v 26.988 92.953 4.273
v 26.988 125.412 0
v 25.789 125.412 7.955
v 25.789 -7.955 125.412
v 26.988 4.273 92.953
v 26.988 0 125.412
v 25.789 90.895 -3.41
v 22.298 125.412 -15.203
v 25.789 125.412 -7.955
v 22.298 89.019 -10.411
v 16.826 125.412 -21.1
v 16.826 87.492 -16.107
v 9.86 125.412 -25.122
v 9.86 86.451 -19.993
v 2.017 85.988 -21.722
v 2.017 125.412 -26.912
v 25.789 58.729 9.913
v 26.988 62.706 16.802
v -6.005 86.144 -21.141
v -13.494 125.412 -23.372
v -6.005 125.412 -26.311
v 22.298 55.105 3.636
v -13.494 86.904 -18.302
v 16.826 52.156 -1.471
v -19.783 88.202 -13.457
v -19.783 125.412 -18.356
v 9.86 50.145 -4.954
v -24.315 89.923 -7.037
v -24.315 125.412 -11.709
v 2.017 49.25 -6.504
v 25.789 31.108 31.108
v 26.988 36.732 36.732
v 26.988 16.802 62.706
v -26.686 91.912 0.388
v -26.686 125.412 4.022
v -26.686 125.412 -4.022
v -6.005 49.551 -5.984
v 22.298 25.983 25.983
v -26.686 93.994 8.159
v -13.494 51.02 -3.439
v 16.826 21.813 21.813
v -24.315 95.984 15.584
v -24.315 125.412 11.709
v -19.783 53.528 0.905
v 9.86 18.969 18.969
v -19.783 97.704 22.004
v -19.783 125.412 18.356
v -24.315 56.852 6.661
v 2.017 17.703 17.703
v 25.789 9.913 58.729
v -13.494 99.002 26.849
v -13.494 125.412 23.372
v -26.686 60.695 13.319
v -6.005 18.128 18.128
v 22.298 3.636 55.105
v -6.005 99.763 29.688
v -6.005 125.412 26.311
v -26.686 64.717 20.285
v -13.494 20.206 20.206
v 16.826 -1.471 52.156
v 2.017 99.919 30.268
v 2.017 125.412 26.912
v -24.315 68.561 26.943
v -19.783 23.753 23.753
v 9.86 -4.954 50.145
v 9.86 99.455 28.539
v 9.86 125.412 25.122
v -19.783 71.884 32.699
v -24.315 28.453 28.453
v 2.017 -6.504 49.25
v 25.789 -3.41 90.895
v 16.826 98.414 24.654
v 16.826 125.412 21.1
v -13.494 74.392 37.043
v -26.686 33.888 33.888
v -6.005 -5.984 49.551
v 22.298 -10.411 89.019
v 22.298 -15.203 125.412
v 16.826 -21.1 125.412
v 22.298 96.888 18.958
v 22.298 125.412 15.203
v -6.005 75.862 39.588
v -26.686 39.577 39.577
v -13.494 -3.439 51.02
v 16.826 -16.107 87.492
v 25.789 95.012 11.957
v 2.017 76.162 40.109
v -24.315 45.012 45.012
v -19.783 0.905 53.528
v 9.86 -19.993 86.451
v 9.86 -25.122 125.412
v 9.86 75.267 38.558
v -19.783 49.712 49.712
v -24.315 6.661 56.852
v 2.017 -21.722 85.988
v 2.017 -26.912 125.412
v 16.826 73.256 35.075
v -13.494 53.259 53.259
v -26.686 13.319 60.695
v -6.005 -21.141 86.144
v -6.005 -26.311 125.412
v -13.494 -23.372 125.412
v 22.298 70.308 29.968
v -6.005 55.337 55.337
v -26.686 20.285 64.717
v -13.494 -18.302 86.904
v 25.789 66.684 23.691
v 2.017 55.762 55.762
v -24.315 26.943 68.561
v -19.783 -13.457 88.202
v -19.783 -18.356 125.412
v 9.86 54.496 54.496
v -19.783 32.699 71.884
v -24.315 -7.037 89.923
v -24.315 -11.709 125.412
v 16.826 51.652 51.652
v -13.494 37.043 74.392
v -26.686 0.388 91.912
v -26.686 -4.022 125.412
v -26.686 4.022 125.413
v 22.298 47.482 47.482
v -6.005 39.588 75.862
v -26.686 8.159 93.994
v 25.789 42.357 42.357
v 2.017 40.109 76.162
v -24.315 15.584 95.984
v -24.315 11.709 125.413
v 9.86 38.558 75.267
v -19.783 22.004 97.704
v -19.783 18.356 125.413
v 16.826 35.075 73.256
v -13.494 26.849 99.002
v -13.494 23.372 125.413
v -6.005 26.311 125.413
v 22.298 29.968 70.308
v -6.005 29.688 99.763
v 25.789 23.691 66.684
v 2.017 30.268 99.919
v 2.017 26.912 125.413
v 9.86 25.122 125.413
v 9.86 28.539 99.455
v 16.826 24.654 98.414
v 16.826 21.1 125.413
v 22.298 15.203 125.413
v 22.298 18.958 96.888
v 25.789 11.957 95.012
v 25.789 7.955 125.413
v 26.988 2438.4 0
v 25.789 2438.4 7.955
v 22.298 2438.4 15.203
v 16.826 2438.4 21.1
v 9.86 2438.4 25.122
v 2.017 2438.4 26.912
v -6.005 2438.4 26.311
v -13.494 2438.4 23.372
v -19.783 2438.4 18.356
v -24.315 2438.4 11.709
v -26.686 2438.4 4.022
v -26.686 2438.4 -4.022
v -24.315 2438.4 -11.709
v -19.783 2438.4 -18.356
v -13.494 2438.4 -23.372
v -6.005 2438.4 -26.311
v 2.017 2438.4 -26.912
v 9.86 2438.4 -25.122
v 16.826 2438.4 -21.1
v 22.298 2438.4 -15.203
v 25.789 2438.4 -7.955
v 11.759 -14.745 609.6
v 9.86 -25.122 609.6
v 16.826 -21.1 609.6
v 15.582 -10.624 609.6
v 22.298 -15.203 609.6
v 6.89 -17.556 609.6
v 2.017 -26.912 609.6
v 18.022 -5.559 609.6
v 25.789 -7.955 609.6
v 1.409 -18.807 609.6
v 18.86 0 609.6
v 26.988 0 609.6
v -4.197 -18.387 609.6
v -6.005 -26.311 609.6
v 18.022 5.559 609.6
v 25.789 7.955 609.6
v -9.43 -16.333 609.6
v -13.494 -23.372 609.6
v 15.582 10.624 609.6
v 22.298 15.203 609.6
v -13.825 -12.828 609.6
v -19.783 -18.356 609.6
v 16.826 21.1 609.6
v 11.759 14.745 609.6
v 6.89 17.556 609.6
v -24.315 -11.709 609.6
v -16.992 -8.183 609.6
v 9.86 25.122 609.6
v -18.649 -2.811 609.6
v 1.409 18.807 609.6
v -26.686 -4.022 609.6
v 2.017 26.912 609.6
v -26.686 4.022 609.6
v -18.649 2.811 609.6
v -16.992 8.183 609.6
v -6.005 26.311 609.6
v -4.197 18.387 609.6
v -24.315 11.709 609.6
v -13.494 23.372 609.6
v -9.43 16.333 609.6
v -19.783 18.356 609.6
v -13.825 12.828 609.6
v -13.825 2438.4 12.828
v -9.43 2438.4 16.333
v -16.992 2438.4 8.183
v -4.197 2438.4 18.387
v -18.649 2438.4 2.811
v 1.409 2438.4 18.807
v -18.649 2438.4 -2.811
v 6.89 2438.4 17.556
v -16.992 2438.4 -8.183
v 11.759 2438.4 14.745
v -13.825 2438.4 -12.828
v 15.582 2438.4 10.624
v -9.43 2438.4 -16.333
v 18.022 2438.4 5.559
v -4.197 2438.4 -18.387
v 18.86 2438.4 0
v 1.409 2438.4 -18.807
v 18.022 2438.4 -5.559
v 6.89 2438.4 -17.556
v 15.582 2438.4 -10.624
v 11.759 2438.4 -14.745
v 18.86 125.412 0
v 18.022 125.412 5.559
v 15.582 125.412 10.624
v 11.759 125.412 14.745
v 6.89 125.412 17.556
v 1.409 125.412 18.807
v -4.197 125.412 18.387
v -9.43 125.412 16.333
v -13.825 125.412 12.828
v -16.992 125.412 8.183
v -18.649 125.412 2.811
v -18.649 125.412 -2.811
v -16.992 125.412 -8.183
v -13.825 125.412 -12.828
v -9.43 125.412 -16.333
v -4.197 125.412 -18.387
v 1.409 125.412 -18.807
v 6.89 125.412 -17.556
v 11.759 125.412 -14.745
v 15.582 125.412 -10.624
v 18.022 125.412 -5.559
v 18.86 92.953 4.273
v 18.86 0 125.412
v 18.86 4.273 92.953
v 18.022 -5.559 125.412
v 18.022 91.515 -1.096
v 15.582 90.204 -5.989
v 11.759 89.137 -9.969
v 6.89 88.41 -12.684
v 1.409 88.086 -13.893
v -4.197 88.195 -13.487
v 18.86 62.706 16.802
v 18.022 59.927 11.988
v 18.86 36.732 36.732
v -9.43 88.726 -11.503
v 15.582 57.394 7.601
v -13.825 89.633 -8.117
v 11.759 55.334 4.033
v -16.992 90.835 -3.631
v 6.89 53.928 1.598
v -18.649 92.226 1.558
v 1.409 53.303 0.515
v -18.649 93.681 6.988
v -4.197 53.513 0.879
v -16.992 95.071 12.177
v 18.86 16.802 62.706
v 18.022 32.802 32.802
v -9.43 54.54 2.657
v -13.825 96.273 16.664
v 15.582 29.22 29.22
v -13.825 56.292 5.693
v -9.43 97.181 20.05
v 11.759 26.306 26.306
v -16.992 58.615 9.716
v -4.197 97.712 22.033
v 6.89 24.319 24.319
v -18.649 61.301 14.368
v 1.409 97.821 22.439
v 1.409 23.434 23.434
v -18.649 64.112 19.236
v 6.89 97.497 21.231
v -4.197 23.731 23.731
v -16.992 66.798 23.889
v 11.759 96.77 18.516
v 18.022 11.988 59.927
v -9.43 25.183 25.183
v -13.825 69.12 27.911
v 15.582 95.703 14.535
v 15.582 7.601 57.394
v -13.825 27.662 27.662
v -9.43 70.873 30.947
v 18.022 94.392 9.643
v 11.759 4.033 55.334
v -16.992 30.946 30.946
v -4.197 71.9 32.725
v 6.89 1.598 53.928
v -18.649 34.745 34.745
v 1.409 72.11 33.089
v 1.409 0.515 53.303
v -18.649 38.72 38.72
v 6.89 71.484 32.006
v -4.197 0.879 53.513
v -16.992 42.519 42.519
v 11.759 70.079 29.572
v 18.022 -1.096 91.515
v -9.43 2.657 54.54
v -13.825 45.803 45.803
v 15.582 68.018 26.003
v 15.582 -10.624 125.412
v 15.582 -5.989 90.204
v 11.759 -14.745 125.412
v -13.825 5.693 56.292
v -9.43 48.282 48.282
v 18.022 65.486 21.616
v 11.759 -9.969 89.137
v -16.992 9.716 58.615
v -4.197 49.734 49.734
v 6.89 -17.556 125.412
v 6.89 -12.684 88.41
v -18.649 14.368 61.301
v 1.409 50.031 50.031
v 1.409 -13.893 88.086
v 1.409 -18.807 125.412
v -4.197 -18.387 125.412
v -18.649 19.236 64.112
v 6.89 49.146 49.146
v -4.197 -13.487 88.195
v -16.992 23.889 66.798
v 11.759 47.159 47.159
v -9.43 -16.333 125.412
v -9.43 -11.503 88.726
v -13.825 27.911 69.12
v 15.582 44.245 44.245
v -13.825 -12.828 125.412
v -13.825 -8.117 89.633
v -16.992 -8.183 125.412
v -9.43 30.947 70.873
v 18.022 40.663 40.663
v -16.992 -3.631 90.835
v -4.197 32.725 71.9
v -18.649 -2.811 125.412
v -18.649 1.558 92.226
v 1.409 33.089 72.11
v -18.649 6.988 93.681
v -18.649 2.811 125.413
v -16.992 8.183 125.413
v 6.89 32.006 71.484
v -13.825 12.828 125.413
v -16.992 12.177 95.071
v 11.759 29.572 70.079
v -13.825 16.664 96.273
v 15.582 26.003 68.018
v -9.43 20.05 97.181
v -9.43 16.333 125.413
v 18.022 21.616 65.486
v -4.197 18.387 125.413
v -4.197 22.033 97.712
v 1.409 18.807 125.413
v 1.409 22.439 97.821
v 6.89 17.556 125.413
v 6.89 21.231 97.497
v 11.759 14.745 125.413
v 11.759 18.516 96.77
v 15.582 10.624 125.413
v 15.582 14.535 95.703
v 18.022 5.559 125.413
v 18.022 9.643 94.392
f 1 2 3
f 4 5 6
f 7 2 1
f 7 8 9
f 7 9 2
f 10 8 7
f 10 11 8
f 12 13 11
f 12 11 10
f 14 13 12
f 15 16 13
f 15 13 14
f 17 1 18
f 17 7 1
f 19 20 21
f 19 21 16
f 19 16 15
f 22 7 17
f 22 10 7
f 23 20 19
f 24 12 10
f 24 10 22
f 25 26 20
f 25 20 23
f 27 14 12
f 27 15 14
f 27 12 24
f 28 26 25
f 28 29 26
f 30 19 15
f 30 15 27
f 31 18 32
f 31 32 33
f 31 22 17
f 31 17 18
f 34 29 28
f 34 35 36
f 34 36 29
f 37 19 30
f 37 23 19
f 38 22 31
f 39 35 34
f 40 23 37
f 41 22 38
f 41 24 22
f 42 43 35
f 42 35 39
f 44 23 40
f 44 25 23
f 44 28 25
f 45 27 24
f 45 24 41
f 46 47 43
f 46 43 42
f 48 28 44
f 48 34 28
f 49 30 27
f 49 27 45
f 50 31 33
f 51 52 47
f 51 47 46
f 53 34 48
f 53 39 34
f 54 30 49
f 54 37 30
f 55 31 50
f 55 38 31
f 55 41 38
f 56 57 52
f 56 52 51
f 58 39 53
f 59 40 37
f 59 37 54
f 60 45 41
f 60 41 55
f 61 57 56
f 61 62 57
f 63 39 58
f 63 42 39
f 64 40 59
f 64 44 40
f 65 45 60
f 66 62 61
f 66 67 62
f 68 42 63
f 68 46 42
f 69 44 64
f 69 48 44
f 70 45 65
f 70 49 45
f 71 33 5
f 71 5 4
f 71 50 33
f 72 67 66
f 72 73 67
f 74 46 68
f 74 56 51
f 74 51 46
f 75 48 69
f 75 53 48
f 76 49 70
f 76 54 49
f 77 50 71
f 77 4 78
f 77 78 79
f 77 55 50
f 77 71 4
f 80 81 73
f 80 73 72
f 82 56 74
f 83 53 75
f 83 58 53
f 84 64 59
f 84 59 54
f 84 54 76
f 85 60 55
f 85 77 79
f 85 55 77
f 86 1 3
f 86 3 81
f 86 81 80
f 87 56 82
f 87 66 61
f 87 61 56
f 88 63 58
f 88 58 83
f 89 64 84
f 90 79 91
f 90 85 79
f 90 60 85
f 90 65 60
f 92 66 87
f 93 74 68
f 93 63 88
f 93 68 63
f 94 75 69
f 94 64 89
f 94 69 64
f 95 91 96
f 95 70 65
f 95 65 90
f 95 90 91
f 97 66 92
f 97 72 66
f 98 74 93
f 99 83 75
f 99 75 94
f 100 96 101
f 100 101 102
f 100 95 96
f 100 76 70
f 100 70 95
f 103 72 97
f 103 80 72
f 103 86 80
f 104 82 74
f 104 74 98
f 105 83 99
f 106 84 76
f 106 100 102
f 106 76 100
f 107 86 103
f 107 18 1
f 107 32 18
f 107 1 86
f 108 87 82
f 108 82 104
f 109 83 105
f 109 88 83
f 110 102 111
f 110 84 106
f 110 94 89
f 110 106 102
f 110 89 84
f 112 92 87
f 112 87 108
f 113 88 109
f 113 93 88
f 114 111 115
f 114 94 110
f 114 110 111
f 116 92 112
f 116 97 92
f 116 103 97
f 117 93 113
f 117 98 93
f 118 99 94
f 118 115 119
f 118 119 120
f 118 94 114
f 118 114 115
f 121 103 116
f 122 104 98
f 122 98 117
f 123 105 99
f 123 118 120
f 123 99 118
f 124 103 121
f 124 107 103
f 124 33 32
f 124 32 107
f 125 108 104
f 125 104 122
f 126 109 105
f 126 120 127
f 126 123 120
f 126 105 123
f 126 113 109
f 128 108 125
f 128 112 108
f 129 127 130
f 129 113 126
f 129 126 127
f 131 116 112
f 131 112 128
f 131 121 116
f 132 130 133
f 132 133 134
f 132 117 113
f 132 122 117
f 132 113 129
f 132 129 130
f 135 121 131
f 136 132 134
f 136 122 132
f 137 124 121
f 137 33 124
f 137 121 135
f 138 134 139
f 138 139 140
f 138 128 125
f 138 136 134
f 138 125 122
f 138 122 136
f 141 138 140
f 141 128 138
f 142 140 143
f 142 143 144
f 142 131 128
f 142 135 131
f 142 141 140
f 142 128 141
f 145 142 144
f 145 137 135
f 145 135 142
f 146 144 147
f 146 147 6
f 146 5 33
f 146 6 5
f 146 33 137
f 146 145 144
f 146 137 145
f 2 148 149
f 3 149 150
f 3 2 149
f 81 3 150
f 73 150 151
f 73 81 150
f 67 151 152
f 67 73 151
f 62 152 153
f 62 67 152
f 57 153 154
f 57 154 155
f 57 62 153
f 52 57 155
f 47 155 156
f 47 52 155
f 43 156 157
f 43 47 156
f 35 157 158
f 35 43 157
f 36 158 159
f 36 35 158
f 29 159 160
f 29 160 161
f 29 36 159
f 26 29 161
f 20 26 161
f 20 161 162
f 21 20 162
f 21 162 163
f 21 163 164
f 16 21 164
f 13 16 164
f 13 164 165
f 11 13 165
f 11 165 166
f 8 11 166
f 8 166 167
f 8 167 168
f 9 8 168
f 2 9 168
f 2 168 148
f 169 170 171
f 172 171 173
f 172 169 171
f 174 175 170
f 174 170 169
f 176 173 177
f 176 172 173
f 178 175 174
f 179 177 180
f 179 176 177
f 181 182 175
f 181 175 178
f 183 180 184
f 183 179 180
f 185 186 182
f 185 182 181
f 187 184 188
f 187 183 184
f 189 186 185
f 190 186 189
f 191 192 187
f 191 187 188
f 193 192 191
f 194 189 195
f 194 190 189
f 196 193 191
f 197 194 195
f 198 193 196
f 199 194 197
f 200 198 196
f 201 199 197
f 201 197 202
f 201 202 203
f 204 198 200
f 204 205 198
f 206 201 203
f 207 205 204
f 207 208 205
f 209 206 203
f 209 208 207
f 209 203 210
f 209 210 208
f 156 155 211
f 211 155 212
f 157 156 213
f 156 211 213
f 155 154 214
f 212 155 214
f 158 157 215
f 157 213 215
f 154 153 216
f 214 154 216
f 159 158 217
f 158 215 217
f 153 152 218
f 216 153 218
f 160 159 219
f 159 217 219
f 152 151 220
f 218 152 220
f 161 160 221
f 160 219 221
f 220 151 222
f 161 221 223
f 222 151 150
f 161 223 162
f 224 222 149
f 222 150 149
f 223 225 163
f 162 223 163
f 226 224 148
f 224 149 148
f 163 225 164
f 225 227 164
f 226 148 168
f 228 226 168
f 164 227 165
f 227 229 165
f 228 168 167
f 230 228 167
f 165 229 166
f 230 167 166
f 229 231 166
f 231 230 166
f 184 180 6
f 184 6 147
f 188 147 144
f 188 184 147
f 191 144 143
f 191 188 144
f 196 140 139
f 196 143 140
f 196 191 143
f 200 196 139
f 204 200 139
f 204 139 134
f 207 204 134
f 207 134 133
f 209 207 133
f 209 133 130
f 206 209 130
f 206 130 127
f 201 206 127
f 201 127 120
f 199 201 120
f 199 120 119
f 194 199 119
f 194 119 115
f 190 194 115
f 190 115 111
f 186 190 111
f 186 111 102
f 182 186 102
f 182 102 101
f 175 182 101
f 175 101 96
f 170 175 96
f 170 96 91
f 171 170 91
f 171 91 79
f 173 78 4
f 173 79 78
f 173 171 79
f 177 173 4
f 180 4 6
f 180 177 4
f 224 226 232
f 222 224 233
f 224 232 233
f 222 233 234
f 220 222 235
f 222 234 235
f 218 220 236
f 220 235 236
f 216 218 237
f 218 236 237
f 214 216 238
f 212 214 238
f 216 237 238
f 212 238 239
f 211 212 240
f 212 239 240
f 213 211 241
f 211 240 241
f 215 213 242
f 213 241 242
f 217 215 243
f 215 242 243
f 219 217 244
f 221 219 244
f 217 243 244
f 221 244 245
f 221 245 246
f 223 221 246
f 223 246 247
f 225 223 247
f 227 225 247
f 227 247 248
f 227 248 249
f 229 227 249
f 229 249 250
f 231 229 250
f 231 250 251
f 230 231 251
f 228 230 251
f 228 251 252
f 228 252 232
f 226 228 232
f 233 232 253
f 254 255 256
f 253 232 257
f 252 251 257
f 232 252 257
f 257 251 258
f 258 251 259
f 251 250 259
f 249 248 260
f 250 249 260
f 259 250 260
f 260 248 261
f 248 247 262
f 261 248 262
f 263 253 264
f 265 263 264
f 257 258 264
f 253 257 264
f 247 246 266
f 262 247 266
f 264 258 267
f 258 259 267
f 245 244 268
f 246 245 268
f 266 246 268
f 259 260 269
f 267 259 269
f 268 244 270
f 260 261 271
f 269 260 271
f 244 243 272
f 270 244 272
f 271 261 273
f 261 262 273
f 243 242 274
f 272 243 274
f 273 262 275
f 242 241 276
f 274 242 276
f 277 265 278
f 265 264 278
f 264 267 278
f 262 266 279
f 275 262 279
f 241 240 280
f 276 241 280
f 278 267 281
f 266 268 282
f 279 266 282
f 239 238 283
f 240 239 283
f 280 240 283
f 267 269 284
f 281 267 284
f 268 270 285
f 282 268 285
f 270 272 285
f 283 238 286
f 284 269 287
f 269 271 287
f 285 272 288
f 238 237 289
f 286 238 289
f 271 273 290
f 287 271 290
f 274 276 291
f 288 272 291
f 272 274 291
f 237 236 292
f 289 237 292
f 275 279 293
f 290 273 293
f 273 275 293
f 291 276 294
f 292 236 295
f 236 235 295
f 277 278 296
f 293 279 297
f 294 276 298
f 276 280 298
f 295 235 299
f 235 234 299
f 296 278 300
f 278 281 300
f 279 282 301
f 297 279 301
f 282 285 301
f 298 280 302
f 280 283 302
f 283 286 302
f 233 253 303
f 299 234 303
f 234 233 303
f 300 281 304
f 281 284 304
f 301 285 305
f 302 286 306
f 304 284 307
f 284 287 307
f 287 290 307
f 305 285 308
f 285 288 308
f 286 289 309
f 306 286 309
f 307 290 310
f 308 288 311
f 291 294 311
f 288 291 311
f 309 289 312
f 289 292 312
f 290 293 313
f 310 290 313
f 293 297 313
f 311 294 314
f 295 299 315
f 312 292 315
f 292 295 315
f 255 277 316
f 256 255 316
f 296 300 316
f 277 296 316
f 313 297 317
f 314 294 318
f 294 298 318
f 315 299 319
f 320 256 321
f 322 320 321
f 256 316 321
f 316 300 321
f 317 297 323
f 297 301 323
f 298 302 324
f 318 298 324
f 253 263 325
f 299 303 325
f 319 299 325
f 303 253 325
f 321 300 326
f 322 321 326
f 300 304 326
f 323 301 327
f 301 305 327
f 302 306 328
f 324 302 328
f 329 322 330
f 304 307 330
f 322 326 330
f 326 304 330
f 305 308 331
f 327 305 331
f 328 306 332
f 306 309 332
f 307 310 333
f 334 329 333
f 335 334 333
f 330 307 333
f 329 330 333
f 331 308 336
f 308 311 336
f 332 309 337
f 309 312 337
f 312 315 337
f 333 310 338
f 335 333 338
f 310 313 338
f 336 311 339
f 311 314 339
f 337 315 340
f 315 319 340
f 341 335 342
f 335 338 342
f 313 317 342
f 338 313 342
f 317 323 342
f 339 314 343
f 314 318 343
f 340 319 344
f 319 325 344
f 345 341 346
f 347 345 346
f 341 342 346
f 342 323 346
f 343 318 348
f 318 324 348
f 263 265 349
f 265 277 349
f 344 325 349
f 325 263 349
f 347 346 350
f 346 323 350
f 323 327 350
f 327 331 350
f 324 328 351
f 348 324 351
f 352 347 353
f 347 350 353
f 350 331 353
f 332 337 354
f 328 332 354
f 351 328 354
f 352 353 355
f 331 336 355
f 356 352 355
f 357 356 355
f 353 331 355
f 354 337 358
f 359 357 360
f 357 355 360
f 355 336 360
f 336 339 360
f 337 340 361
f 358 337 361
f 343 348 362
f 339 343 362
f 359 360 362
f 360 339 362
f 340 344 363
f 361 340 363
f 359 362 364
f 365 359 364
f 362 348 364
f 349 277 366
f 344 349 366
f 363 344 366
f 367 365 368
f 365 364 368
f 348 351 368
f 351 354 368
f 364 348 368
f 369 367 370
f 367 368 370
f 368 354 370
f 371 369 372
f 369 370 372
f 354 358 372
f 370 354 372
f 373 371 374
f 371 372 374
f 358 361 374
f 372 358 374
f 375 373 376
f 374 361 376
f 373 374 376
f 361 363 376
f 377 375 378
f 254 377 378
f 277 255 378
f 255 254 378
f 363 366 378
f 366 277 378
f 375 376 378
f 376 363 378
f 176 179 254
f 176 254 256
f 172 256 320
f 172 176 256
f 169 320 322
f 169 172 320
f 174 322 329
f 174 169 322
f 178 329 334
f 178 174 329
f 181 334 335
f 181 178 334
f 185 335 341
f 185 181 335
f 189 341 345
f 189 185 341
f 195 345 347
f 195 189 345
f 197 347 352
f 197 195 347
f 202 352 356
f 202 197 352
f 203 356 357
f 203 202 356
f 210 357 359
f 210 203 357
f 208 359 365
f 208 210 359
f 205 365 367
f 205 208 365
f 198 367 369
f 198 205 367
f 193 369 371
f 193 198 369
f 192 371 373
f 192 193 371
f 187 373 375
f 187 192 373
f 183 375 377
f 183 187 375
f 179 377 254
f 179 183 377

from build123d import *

# Parameters (mm, degrees)
F2_R   = 26.9875
F2_R_2 = 18.8595


with BuildPart() as f3:
    # F3: sweep along a path in F0
    with BuildLine(Plane.YZ) as f3_path:
        Line((2438.4, 0), (125.4125, 0))
        ThreePointArc((125.4125, 0), (36.732471, 36.732471), (0, 125.4125))
        Line((0, 125.4125), (0, 609.6))
    # F2 (on plane+point) → F3 (sweep)
    with BuildSketch(Plane.XZ.offset(-2438.4)):
        Circle(F2_R)
        Circle(F2_R_2, mode=Mode.SUBTRACT)
    sweep(path=f3_path.line)


solid = f3.part
